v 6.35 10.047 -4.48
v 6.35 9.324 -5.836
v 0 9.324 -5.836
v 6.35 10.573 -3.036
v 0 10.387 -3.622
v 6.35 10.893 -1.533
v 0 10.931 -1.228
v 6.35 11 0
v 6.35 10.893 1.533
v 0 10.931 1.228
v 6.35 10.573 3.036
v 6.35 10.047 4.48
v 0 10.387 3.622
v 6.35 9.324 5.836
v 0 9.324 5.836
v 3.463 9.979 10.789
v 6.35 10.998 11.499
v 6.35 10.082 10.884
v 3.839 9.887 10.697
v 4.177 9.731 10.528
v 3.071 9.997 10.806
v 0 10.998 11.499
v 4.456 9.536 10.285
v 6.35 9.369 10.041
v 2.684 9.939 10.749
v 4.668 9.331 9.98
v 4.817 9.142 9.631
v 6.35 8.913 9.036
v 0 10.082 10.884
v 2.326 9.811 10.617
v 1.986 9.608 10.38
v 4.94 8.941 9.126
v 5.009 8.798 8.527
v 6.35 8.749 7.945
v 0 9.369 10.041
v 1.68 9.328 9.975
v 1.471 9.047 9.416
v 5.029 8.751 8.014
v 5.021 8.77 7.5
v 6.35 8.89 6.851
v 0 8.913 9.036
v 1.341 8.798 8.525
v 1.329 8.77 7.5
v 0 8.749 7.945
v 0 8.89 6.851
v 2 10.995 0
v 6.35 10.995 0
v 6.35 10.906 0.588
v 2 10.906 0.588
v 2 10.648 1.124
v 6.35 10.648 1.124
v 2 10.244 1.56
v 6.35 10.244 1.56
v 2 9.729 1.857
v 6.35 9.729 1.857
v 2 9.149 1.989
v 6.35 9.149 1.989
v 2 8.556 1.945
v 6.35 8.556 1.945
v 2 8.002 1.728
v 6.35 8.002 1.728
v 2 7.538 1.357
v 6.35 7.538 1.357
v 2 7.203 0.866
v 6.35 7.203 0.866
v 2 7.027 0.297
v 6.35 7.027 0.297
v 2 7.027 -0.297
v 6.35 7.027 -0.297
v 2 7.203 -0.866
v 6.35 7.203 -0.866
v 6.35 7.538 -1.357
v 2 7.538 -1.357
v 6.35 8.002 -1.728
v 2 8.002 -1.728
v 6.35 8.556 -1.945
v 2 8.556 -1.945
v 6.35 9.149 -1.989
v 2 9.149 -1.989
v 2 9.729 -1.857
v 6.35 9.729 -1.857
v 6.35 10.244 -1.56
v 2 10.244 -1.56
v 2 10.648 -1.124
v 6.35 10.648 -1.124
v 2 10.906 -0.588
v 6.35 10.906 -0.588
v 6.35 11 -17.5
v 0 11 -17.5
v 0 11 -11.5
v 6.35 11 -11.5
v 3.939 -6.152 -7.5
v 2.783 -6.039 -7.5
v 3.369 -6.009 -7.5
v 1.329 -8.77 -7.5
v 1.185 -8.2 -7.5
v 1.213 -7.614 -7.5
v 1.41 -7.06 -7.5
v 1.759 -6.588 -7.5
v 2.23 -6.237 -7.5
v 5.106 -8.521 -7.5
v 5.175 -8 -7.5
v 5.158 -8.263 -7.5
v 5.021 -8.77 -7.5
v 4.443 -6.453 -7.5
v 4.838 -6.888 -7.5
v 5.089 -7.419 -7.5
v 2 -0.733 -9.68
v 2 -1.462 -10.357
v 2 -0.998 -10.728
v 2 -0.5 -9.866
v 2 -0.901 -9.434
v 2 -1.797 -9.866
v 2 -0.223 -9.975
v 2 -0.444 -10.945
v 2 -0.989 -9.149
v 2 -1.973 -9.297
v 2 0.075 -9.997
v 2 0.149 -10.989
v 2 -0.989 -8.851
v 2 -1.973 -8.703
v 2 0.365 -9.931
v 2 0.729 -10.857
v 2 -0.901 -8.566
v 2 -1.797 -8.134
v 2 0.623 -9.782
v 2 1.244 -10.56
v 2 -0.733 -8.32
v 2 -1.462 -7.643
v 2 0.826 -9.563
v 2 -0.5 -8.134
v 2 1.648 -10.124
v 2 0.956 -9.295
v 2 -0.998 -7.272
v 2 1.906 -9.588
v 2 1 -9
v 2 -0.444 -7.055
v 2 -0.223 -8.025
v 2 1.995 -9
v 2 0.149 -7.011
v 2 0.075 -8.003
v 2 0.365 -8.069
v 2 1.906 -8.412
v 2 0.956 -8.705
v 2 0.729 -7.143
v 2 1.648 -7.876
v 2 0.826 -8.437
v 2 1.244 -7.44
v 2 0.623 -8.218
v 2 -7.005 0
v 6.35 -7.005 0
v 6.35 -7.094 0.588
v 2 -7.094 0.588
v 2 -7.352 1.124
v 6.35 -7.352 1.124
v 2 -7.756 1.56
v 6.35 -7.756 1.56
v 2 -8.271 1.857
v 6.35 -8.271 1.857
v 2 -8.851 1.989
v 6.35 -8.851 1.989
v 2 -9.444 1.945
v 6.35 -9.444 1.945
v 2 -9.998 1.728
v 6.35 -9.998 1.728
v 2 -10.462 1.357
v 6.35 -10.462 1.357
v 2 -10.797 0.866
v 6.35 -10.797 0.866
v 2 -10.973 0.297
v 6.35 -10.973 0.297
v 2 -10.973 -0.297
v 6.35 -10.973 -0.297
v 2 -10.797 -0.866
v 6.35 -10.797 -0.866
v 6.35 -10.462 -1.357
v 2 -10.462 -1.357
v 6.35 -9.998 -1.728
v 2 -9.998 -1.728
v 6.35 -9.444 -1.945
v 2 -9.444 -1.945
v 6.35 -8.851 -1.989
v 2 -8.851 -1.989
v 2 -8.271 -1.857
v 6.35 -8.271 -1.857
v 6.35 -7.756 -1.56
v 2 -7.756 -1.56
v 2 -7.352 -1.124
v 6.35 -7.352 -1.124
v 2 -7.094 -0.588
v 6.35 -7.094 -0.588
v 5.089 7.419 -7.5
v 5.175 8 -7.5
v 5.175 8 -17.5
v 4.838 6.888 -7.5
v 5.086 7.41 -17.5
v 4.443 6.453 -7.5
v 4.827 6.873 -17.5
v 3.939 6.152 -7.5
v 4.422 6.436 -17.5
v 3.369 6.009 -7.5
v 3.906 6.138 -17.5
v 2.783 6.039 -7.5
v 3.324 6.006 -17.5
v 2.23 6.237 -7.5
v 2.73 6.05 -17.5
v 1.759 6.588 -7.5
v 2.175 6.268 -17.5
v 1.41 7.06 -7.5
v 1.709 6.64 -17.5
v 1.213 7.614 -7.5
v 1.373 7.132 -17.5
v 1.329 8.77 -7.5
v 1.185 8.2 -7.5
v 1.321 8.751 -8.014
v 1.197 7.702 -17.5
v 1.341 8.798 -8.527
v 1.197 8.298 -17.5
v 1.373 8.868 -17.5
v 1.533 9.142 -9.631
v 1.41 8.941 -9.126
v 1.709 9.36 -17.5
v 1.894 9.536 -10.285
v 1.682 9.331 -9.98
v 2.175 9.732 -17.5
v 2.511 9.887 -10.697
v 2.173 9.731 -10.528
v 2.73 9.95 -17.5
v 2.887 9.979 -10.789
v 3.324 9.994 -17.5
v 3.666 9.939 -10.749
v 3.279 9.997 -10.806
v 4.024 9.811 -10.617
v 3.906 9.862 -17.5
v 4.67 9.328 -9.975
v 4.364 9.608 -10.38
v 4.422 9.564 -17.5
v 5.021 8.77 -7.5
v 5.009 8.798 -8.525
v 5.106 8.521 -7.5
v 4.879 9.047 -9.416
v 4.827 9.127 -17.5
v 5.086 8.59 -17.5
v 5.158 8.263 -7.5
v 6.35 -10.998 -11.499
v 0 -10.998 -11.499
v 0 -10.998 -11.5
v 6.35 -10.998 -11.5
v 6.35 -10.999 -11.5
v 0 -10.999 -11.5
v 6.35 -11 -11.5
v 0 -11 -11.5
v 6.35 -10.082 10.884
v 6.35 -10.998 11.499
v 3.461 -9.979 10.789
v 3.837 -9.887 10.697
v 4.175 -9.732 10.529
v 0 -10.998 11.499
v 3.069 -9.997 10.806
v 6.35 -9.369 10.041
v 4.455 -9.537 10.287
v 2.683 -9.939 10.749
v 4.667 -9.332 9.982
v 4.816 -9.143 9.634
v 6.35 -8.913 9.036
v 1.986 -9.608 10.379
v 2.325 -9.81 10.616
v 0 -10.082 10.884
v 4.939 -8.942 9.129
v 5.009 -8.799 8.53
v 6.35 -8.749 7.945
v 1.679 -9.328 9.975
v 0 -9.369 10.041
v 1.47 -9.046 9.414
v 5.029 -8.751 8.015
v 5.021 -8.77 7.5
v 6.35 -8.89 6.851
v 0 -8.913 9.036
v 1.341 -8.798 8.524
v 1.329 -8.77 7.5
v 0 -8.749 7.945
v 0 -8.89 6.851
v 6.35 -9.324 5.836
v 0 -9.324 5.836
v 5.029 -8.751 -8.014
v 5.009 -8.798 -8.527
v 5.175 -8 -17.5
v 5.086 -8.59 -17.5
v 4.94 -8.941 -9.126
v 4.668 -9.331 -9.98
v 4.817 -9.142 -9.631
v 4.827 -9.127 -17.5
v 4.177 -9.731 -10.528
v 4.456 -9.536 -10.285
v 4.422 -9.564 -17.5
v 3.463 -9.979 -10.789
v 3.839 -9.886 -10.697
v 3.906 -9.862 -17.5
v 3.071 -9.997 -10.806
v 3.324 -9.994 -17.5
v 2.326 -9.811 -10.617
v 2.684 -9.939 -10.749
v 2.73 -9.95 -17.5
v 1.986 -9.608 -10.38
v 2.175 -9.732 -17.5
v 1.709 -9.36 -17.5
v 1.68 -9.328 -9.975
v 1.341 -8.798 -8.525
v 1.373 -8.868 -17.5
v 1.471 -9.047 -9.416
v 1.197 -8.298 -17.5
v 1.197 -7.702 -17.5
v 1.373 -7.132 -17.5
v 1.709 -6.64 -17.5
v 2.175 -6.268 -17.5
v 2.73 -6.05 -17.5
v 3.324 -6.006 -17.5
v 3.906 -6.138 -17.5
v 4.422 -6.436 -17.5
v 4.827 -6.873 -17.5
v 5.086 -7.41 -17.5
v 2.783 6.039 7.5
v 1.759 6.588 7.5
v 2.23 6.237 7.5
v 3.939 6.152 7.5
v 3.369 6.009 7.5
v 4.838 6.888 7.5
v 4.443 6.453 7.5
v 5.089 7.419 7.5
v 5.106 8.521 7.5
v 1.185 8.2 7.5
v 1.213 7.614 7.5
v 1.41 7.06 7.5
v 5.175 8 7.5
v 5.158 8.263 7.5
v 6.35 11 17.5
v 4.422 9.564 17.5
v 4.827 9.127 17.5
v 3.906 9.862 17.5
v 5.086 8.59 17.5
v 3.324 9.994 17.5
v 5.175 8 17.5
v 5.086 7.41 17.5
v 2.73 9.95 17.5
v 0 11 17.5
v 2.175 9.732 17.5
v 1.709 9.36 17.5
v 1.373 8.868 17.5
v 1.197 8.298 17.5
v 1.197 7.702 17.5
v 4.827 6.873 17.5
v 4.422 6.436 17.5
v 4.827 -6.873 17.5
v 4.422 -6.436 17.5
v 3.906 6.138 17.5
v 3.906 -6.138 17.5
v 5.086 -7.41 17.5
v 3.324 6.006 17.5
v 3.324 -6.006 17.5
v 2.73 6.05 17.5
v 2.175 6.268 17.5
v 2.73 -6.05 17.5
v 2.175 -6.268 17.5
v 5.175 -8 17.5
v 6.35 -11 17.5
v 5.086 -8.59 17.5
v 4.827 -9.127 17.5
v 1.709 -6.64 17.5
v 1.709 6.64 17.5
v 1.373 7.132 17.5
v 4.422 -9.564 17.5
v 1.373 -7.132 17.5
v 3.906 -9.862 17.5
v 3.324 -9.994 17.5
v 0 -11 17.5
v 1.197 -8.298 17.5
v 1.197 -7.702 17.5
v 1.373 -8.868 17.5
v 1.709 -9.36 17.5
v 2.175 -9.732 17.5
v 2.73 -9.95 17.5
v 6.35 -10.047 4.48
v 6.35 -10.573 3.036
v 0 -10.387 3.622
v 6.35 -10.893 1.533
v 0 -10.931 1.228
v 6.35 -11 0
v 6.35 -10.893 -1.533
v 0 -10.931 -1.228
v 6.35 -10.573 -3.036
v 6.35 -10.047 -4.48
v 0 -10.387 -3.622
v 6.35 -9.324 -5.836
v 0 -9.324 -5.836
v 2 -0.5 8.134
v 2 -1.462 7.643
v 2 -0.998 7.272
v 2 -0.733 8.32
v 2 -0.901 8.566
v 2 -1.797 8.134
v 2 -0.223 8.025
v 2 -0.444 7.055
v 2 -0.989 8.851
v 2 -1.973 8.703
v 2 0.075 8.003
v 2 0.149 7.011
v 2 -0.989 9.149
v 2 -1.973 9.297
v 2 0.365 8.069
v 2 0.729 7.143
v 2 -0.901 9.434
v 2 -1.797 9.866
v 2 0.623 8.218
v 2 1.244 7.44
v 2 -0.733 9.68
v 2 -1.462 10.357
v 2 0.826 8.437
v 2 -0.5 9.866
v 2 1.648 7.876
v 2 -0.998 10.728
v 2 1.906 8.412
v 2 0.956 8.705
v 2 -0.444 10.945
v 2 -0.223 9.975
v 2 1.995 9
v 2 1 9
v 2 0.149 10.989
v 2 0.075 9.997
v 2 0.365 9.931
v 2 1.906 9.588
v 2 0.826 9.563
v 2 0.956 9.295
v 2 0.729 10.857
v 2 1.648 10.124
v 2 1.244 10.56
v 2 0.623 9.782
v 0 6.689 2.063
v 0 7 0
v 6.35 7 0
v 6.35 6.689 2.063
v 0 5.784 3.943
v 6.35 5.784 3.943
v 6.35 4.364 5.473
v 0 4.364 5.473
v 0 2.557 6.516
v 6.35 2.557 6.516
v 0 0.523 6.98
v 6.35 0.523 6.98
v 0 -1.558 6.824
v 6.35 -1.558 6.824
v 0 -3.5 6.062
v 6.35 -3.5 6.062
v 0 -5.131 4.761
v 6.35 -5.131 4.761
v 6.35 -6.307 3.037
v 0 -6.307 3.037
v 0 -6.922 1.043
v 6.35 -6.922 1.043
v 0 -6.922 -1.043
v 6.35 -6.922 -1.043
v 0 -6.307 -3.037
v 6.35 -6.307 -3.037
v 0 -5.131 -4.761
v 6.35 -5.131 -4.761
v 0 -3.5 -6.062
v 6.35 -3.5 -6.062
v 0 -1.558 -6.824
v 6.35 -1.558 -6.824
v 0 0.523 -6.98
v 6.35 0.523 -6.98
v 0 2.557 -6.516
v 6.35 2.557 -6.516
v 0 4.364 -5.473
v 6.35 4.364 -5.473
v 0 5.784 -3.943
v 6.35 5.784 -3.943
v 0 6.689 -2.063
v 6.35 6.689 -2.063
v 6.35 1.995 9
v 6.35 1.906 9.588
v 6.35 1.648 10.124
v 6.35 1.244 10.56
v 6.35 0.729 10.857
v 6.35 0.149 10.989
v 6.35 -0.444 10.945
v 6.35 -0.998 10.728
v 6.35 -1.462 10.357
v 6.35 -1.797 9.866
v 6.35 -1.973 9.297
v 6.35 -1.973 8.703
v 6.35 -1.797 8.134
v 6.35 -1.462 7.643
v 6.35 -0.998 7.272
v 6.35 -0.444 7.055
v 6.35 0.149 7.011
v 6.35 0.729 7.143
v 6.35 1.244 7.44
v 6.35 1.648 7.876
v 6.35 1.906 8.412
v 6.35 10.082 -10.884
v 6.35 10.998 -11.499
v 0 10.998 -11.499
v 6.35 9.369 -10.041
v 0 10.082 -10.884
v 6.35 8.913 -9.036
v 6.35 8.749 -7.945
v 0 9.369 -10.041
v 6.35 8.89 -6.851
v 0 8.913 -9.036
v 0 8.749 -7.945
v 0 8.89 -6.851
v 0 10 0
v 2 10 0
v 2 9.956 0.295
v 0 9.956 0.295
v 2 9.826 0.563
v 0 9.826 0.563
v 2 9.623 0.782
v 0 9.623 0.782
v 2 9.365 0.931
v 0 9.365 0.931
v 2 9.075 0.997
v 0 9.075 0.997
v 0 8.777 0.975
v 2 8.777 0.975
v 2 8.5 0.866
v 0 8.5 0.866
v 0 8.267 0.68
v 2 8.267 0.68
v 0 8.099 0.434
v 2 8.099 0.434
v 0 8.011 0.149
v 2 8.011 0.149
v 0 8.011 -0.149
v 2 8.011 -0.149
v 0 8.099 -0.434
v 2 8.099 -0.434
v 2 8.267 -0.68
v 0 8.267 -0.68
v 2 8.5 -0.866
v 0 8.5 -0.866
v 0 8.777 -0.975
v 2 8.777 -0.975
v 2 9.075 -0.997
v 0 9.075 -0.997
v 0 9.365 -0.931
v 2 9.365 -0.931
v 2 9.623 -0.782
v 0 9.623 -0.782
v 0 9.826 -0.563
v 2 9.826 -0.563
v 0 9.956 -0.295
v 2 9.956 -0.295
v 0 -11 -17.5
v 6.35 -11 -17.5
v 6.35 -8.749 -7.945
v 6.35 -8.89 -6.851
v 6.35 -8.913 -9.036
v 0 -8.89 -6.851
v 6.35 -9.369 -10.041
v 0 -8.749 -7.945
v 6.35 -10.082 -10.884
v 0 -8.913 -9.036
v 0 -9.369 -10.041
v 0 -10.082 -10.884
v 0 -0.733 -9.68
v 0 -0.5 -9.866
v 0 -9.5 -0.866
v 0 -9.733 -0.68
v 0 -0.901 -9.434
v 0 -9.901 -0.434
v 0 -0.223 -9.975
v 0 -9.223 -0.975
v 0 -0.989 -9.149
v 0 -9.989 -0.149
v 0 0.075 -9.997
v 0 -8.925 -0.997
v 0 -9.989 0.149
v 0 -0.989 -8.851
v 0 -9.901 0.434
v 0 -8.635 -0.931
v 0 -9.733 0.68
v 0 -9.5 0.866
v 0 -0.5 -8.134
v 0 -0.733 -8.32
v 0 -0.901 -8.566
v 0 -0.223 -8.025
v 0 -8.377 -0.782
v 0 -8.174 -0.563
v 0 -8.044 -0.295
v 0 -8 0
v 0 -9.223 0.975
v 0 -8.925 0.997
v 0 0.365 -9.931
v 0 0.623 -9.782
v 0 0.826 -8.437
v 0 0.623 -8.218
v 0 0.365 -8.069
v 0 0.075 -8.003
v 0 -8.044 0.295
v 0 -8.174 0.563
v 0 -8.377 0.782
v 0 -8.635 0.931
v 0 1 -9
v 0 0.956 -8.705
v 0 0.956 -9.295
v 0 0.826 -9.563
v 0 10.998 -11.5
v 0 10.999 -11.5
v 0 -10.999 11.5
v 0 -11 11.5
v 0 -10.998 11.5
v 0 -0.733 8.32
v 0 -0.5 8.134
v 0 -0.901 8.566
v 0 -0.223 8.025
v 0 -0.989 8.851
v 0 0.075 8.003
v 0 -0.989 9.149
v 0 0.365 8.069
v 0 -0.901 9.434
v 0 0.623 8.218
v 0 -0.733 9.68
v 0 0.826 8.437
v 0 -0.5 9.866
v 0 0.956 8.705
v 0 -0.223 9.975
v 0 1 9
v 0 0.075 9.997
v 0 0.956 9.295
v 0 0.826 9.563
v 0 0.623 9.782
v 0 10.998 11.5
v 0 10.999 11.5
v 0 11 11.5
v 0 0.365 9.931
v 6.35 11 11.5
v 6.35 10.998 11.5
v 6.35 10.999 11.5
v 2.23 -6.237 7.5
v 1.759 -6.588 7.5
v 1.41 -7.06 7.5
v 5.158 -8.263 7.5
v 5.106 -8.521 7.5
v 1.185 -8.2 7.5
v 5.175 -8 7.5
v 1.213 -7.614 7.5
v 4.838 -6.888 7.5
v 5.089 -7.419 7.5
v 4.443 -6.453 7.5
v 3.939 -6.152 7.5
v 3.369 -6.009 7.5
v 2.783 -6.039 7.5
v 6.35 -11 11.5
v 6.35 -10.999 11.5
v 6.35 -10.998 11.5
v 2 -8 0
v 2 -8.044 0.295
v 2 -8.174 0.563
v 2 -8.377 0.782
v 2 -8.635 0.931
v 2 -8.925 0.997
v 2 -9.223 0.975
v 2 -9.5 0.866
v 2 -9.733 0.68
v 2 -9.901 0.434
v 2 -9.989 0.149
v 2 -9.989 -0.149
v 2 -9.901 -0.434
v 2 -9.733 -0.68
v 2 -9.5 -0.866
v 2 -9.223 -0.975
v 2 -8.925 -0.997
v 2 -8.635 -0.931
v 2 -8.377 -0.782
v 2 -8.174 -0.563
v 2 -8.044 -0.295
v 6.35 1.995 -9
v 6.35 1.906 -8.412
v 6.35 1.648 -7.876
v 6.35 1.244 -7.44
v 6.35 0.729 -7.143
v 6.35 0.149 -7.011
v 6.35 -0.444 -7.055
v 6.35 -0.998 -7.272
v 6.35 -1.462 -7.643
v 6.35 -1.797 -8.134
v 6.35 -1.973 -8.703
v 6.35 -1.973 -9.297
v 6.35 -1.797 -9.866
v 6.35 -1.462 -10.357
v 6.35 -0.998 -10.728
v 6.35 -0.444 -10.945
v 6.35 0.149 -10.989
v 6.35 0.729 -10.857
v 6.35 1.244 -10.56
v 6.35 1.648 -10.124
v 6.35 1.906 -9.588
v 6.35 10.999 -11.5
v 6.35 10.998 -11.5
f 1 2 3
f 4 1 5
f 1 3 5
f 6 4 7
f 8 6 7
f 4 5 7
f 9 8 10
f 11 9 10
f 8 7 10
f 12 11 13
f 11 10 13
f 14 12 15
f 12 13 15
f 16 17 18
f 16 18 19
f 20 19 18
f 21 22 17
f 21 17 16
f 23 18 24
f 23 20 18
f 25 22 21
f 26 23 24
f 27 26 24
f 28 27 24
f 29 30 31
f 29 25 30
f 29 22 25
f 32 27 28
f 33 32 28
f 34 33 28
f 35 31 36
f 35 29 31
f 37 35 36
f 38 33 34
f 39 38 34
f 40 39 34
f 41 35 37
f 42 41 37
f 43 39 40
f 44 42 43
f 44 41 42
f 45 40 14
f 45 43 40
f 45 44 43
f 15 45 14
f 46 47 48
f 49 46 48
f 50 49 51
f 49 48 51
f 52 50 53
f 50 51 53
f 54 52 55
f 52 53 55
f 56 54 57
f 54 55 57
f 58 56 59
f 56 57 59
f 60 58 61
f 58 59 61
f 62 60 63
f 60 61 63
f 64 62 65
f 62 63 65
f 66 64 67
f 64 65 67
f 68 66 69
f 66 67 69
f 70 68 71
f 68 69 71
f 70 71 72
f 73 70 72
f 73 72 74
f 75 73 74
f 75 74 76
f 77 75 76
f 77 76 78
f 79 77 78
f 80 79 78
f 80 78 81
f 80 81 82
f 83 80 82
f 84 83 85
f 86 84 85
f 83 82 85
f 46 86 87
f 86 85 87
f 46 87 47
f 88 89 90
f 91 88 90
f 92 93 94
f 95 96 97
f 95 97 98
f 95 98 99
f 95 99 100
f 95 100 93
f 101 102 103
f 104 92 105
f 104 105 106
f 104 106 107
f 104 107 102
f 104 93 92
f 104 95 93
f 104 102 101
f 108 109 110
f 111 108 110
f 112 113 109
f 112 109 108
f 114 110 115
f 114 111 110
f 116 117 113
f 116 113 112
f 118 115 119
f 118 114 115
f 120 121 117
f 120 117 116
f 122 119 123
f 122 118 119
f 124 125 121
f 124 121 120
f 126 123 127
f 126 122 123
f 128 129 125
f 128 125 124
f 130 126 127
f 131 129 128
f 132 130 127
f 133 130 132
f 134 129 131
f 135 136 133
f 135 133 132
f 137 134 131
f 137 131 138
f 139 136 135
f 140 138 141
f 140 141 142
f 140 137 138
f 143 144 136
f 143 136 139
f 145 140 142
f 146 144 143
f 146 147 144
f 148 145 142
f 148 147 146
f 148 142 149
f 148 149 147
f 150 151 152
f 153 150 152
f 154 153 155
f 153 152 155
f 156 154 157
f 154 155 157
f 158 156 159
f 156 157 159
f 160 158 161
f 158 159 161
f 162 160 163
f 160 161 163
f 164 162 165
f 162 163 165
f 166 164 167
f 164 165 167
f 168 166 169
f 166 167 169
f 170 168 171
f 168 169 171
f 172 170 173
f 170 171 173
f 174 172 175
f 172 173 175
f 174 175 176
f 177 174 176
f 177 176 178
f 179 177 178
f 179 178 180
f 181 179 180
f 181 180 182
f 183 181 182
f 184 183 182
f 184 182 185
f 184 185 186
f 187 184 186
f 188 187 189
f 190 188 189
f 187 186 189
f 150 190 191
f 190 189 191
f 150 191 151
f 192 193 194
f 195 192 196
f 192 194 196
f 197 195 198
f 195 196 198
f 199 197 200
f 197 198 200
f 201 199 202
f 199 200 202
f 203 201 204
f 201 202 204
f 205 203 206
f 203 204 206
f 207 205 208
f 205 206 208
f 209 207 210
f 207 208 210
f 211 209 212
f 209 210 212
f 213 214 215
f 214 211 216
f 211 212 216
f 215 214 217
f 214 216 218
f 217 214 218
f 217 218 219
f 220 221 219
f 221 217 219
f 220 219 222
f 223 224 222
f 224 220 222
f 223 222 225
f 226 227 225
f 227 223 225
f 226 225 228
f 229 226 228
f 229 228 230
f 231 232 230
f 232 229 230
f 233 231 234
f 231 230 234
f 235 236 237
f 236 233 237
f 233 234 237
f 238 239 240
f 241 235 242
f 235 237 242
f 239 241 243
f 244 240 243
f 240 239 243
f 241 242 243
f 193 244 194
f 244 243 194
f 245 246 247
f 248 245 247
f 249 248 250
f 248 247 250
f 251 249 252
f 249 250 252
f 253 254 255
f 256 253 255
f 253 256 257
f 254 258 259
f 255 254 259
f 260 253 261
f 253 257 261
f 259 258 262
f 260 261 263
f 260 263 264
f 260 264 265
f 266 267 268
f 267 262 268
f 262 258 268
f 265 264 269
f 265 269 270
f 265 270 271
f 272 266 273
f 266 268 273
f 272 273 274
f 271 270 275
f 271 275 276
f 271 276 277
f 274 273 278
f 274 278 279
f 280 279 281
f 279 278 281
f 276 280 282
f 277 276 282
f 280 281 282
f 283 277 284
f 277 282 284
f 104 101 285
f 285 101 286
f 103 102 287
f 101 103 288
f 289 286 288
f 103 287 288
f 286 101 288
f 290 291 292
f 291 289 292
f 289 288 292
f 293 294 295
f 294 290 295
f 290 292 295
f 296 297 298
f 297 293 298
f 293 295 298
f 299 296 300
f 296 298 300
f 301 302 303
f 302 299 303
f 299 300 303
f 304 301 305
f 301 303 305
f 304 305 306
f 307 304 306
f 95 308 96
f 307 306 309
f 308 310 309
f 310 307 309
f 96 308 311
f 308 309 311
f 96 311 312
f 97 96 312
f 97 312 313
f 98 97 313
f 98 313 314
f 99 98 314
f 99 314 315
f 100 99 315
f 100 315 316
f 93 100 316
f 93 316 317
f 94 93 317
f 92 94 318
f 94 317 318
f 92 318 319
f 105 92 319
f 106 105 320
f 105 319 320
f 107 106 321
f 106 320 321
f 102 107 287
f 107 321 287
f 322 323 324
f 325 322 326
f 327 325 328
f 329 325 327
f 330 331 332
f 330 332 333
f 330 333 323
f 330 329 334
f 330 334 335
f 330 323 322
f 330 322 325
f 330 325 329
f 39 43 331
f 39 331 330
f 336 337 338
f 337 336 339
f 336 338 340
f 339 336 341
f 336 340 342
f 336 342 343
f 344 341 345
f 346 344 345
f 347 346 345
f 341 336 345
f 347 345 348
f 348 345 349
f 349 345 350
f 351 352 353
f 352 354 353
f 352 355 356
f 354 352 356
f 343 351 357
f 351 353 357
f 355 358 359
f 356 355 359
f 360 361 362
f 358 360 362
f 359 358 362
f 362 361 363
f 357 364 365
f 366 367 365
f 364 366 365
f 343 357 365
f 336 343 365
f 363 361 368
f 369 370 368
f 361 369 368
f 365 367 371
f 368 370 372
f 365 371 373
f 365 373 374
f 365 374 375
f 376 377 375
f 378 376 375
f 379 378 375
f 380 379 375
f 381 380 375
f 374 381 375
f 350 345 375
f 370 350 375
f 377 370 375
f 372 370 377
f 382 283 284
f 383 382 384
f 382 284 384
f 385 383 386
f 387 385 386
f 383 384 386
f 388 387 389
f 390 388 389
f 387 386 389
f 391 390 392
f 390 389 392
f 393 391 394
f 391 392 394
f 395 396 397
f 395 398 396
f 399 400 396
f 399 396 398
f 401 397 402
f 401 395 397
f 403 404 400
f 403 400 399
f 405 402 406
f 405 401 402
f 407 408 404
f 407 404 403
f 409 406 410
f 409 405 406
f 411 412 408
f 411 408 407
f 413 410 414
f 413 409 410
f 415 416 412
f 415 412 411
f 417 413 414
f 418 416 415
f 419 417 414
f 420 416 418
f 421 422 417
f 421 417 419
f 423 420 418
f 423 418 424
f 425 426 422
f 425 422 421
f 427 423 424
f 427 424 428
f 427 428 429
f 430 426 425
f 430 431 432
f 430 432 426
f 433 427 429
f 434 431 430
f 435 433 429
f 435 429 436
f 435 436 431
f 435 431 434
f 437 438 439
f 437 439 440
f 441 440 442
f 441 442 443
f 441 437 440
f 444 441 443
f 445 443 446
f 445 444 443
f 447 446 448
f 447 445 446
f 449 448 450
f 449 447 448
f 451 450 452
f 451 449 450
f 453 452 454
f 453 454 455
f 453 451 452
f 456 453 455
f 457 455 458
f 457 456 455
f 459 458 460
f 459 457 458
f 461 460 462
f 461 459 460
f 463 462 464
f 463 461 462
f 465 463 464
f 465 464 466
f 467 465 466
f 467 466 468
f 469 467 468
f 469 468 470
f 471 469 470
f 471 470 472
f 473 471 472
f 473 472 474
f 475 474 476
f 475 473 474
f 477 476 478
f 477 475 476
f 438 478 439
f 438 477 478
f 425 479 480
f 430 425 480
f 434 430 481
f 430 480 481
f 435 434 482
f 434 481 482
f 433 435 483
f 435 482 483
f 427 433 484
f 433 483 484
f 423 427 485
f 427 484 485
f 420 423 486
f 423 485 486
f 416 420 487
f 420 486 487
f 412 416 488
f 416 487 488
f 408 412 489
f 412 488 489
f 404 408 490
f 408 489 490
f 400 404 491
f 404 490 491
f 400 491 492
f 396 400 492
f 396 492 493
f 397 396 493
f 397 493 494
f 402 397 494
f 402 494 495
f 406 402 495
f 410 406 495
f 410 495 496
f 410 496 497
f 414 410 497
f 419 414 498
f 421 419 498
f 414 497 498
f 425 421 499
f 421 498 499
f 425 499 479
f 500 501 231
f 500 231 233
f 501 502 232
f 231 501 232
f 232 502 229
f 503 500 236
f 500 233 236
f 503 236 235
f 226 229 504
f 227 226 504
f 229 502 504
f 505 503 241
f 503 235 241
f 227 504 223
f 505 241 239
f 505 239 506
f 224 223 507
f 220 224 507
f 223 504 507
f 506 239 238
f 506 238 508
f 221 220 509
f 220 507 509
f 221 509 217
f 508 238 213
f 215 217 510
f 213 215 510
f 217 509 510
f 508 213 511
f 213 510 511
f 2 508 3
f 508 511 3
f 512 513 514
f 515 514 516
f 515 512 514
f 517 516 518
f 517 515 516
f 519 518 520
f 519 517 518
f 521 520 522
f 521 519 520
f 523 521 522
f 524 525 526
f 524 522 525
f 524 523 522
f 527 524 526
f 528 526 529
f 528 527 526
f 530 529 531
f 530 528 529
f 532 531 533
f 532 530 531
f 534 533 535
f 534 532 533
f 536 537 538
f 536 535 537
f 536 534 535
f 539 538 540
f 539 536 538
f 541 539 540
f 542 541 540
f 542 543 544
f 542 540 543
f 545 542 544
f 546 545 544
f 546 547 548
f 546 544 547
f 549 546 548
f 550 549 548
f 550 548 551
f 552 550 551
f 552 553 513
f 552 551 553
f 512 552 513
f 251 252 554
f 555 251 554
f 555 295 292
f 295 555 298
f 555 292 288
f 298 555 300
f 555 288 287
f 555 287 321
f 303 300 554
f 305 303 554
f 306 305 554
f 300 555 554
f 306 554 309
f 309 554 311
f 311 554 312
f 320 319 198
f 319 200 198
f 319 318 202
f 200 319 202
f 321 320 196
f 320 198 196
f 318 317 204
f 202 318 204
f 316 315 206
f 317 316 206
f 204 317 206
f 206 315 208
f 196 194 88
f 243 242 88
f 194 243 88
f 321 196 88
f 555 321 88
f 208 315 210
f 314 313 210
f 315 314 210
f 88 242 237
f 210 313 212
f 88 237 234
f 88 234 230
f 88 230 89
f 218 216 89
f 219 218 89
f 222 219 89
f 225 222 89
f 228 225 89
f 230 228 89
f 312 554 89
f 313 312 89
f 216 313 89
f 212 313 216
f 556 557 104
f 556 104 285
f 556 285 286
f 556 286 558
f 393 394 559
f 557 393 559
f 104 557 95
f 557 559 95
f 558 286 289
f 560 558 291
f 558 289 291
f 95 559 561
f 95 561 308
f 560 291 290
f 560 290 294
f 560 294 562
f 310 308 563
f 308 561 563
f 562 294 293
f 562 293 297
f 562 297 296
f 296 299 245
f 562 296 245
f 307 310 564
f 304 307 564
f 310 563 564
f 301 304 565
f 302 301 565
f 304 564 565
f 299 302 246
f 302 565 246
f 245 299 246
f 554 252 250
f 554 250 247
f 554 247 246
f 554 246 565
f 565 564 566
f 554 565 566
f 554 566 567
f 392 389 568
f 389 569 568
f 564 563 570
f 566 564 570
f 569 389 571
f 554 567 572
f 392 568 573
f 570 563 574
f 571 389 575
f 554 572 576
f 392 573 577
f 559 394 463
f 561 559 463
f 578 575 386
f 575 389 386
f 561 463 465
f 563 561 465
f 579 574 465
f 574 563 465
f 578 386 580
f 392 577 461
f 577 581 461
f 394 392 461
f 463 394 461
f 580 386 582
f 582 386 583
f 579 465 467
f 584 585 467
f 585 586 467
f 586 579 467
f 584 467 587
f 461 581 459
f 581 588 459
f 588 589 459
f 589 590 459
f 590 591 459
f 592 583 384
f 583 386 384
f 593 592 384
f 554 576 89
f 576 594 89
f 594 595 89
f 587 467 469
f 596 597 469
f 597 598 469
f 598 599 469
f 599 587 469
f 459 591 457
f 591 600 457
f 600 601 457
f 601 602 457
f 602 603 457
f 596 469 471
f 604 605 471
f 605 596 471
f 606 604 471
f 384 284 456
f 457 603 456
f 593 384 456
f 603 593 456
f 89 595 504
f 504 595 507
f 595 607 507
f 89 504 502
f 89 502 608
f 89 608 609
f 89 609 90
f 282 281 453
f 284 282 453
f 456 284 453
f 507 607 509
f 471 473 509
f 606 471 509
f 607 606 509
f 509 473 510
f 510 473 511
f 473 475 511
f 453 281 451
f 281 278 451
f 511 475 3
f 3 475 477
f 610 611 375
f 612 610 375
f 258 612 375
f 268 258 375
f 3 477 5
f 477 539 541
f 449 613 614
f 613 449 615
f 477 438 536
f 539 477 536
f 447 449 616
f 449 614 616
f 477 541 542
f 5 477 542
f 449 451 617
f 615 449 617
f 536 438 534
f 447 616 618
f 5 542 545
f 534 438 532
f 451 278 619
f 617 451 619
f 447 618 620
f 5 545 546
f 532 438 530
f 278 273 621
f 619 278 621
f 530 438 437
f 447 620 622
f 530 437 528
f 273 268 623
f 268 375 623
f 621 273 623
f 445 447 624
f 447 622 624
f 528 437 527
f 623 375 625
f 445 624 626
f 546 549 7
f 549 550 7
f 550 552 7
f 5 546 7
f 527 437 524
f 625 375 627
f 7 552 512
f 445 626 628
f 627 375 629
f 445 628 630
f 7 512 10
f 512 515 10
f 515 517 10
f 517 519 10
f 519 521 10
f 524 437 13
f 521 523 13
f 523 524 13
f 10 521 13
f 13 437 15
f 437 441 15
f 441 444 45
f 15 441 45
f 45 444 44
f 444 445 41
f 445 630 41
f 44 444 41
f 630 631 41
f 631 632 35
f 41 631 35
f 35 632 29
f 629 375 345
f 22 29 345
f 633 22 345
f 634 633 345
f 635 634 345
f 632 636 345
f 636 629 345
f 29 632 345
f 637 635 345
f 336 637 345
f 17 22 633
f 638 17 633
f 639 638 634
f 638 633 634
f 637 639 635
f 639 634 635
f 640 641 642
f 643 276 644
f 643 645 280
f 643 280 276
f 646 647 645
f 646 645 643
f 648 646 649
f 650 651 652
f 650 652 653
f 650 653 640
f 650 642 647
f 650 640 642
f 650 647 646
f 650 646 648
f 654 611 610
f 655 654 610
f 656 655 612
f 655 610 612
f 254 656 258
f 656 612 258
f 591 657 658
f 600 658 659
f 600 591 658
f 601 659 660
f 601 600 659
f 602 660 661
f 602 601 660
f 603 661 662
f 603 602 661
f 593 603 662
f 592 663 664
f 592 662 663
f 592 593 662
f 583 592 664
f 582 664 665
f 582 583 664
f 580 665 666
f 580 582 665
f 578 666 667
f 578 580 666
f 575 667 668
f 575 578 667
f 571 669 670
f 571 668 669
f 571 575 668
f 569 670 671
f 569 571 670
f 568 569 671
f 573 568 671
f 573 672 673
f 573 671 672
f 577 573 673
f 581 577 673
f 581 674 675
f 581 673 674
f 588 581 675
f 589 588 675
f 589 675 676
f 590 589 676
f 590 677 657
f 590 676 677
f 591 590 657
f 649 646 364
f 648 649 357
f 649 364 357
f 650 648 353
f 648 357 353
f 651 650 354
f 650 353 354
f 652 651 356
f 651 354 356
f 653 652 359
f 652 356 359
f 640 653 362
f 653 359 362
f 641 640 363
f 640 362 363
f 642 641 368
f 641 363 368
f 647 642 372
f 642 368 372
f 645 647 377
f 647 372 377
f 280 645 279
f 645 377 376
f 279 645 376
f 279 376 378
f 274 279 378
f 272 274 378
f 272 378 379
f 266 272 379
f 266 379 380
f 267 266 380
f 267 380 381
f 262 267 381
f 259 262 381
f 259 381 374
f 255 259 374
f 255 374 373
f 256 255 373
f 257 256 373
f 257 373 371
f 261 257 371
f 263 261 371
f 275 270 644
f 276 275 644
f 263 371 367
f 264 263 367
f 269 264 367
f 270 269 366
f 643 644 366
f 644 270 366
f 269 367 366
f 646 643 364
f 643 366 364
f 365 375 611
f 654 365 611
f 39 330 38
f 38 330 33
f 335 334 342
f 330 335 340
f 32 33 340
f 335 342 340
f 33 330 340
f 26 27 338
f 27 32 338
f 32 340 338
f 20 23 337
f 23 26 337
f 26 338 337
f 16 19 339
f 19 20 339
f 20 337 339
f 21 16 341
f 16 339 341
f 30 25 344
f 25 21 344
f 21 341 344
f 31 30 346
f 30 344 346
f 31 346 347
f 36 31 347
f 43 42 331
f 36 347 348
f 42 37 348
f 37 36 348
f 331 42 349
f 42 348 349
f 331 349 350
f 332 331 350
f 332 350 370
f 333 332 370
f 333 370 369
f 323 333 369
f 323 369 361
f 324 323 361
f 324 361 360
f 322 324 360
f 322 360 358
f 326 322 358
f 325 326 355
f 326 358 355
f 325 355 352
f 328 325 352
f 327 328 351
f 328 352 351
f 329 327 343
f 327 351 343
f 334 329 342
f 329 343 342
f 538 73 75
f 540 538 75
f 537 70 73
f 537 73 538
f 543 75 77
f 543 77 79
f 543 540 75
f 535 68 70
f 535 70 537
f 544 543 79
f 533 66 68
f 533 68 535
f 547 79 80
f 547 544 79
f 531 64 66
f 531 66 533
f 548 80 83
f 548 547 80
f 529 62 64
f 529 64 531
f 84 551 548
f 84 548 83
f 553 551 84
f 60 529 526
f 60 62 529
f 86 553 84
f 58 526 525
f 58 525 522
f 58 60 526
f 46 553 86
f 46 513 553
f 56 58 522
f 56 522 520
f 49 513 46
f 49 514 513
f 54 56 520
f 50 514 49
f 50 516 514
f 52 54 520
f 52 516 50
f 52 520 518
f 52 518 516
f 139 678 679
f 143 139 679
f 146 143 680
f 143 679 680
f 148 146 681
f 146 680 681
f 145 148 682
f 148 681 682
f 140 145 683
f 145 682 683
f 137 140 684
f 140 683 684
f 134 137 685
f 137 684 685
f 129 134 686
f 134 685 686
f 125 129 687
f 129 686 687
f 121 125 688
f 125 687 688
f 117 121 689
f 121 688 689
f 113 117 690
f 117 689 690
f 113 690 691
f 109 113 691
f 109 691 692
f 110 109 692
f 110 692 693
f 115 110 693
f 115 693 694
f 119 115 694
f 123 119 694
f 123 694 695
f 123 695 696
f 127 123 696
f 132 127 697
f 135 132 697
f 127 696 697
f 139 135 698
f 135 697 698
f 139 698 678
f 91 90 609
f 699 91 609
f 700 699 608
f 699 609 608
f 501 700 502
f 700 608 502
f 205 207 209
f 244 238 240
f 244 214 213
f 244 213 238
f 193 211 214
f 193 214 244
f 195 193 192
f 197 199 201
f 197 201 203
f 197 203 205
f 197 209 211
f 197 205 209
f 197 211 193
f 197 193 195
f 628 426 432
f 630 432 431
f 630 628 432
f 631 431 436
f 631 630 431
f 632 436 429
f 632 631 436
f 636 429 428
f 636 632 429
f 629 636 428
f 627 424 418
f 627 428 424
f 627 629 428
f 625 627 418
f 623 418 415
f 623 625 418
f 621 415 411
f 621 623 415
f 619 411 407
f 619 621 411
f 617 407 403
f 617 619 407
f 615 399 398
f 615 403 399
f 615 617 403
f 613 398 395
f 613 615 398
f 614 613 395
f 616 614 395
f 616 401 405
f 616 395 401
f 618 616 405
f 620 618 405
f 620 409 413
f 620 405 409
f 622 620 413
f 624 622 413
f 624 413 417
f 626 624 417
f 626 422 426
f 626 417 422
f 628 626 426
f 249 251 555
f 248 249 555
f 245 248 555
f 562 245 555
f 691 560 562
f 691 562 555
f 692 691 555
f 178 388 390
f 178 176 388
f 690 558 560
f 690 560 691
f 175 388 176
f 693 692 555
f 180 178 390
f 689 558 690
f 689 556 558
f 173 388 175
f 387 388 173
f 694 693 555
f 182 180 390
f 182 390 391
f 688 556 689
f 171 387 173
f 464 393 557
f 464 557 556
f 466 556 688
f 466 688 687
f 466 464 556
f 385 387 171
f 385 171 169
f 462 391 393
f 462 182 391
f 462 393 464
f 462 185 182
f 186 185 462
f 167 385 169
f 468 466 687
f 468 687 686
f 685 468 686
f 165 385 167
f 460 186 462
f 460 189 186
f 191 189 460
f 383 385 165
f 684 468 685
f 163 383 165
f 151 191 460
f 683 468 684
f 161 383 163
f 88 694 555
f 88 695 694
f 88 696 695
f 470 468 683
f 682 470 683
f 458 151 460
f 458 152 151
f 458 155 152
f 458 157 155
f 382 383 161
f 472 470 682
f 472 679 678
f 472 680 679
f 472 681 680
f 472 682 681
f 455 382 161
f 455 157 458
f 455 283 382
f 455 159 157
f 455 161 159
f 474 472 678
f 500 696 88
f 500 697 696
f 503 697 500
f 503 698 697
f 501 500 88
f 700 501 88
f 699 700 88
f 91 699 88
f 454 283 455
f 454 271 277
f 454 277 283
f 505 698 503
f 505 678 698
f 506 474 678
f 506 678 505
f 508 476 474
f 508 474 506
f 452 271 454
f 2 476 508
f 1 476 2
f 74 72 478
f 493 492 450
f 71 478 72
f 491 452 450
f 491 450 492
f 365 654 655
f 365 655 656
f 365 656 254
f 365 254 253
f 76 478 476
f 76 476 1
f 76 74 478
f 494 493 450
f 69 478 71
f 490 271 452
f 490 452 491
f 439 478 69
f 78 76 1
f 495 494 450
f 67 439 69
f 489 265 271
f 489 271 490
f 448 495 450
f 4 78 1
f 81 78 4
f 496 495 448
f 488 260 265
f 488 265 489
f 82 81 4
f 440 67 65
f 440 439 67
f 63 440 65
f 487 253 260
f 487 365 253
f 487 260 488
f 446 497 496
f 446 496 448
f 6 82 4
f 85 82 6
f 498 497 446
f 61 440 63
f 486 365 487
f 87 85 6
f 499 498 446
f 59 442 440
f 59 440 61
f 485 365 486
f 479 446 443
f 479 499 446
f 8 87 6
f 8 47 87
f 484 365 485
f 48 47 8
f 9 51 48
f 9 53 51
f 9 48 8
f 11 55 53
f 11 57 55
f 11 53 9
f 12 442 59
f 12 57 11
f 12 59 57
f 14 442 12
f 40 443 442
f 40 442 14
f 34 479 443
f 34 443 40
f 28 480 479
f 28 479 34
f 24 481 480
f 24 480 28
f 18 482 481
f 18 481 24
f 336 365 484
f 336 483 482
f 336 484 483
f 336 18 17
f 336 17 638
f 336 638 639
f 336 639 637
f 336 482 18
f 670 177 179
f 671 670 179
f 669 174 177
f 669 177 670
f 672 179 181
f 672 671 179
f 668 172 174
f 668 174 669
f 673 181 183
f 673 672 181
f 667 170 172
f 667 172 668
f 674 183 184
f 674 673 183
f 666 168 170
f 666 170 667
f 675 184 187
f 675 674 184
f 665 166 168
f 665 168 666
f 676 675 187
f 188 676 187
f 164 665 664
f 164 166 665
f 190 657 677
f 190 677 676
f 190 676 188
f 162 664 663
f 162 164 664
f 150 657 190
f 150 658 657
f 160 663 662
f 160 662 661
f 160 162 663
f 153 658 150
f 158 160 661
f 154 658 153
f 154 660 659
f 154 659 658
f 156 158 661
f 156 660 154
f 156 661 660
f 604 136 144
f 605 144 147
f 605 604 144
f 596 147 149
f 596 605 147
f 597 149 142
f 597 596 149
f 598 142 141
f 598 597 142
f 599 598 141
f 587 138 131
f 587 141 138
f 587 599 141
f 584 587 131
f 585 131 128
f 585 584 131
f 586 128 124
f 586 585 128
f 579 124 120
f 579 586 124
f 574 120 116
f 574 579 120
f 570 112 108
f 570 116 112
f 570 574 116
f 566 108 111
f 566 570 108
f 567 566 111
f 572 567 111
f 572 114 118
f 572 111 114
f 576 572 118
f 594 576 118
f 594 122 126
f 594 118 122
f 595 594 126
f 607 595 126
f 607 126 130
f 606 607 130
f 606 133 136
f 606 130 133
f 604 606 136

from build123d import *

# Parameters (mm, degrees)
F0_R        = 1
F0_R_2      = 7
F1_DEPTH    = 6.35
F2_T1_DEPTH = 6.35
F3_R        = 1.995
F4_DEPTH    = 4.35
F5_R        = 2
F6_DEPTH    = 10
F7_R        = 2
F8_DEPTH    = 10


# Not quite as in the source:
# - a fillet or chamfer that OpenCascade refuses, or shapes differently, is made with other operations: its cross-section is extruded or revolved along the edge and cut away or added


with BuildPart() as f1:
    # F0 (on Right) → F1 (new body)
    with BuildSketch(Plane.YZ):
        with BuildLine():
            ThreePointArc((-11, 11.5), (-8.5663313628, 10.4710489148), (-6.4168428396, 8.9344349554))
            ThreePointArc((-6.4168428396, 8.9344349554), (-11, 0), (-6.4168428396, -8.9344349554))
            ThreePointArc((-6.4168428396, -8.9344349554), (-8.5663313628, -10.4710489148), (-11, -11.5))
            Line((-11, -11.5), (-11, -17.5))
            Line((-11, -17.5), (11, -17.5))
            Line((11, -17.5), (11, -11.5))
            ThreePointArc((11, -11.5), (8.5663313628, -10.4710489148), (6.4168428396, -8.9344349554))
            ThreePointArc((6.4168428396, -8.9344349554), (11, 0), (6.4168428396, 8.9344349554))
            ThreePointArc((6.4168428396, 8.9344349554), (8.5663313628, 10.4710489148), (11, 11.5))
            Line((11, 11.5), (11, 17.5))
            Line((11, 17.5), (-11, 17.5))
            Line((-11, 17.5), (-11, 11.5))
        make_face()
        with Locations((0, -9)):
            Circle(F0_R, mode=Mode.SUBTRACT)
        with Locations((-9, 0)):
            Circle(F0_R, mode=Mode.SUBTRACT)
        Circle(F0_R_2, mode=Mode.SUBTRACT)
        with Locations((9, 0)):
            Circle(F0_R, mode=Mode.SUBTRACT)
        with Locations((0, 9)):
            Circle(F0_R, mode=Mode.SUBTRACT)
    extrude(amount=F1_DEPTH)

    # F2: fillet of radius 4 on 4 edges, made by hand

    # F2_s2 → F2_t1 (join)
    with BuildSketch(Plane.YZ):
        with BuildLine():
            ThreePointArc((-10.9998249992, 11.500359687), (-8.9067871665, 9.0142668997), (-9.3494629478, 5.7947167962))
            Line((-9.3494629478, 5.7947167962), (-9.0093791138, 5.5839357582))
            ThreePointArc((-9.0093791138, 5.5839357582), (-7.7456923262, 7.2361578693), (-6.1834406461, 8.6094594545))
            Line((-6.1834406461, 8.6094594545), (-6.1497385524, 9.2323291646))
            ThreePointArc((-6.1497385524, 9.2323291646), (-8.3709064916, 10.8201832442), (-10.8247773704, 11.8601429381))
            Line((-10.8247773704, 11.8601429381), (-10.9998249992, 11.500359687))
        make_face()
        with BuildLine():
            ThreePointArc((-9.3494629478, -5.7947167962), (-8.9067871665, -9.0142668997), (-10.9998249992, -11.500359687))
            Line((-10.9998249992, -11.500359687), (-10.8247773704, -11.8601429381))
            ThreePointArc((-10.8247773704, -11.8601429381), (-8.3709064916, -10.8201832442), (-6.1497385524, -9.2323291646))
            Line((-6.1497385524, -9.2323291646), (-6.1834406461, -8.6094594545))
            ThreePointArc((-6.1834406461, -8.6094594545), (-7.7456923262, -7.2361578693), (-9.0093791138, -5.5839357582))
            Line((-9.0093791138, -5.5839357582), (-9.3494629478, -5.7947167962))
        make_face()
        with BuildLine():
            ThreePointArc((10.9998249992, -11.500359687), (8.9067871665, -9.0142668997), (9.3494629478, -5.7947167962))
            Line((9.3494629478, -5.7947167962), (9.0093791138, -5.5839357582))
            ThreePointArc((9.0093791138, -5.5839357582), (7.7456923262, -7.2361578693), (6.1834406461, -8.6094594545))
            Line((6.1834406461, -8.6094594545), (6.1497385524, -9.2323291646))
            ThreePointArc((6.1497385524, -9.2323291646), (8.3709064916, -10.8201832442), (10.8247773704, -11.8601429381))
            Line((10.8247773704, -11.8601429381), (10.9998249992, -11.500359687))
        make_face()
        with BuildLine():
            ThreePointArc((10.9998249992, 11.500359687), (8.9067871665, 9.0142668997), (9.3494629478, 5.7947167962))
            Line((9.3494629478, 5.7947167962), (9.0093791138, 5.5839357582))
            ThreePointArc((9.0093791138, 5.5839357582), (7.7456923262, 7.2361578693), (6.1834406461, 8.6094594545))
            Line((6.1834406461, 8.6094594545), (6.1497385524, 9.2323291646))
            ThreePointArc((6.1497385524, 9.2323291646), (8.3709064916, 10.8201832442), (10.8247773704, 11.8601429381))
            Line((10.8247773704, 11.8601429381), (10.9998249992, 11.500359687))
        make_face()
    extrude(amount=F2_T1_DEPTH)

    # F3 (on face) → F4 (cut)
    with BuildSketch(Plane.YZ.offset(6.35)):
        with Locations((0, 9)):
            Circle(F3_R)
        with Locations((9, 0)):
            Circle(F3_R)
        with Locations((0, -9)):
            Circle(F3_R)
        with Locations((-9, 0)):
            Circle(F3_R)
    extrude(amount=-F4_DEPTH, mode=Mode.SUBTRACT)

    # F5 (on face) → F6 (cut)
    with BuildSketch(Plane.XY.offset(17.5)):
        with Locations((3.175, 8)):
            Circle(F5_R)
        with Locations((3.175, -8)):
            Circle(F5_R)
    extrude(amount=-F6_DEPTH, mode=Mode.SUBTRACT)

    # F7 (on face) → F8 (cut)
    with BuildSketch(Plane(origin=(0, 0, -17.5), x_dir=(1, 0, 0), z_dir=(0, 0, -1))):
        with Locations((3.175, 8)):
            Circle(F7_R)
        with Locations((3.175, -8)):
            Circle(F7_R)
    extrude(amount=-F8_DEPTH, mode=Mode.SUBTRACT)


solid = f1.part
